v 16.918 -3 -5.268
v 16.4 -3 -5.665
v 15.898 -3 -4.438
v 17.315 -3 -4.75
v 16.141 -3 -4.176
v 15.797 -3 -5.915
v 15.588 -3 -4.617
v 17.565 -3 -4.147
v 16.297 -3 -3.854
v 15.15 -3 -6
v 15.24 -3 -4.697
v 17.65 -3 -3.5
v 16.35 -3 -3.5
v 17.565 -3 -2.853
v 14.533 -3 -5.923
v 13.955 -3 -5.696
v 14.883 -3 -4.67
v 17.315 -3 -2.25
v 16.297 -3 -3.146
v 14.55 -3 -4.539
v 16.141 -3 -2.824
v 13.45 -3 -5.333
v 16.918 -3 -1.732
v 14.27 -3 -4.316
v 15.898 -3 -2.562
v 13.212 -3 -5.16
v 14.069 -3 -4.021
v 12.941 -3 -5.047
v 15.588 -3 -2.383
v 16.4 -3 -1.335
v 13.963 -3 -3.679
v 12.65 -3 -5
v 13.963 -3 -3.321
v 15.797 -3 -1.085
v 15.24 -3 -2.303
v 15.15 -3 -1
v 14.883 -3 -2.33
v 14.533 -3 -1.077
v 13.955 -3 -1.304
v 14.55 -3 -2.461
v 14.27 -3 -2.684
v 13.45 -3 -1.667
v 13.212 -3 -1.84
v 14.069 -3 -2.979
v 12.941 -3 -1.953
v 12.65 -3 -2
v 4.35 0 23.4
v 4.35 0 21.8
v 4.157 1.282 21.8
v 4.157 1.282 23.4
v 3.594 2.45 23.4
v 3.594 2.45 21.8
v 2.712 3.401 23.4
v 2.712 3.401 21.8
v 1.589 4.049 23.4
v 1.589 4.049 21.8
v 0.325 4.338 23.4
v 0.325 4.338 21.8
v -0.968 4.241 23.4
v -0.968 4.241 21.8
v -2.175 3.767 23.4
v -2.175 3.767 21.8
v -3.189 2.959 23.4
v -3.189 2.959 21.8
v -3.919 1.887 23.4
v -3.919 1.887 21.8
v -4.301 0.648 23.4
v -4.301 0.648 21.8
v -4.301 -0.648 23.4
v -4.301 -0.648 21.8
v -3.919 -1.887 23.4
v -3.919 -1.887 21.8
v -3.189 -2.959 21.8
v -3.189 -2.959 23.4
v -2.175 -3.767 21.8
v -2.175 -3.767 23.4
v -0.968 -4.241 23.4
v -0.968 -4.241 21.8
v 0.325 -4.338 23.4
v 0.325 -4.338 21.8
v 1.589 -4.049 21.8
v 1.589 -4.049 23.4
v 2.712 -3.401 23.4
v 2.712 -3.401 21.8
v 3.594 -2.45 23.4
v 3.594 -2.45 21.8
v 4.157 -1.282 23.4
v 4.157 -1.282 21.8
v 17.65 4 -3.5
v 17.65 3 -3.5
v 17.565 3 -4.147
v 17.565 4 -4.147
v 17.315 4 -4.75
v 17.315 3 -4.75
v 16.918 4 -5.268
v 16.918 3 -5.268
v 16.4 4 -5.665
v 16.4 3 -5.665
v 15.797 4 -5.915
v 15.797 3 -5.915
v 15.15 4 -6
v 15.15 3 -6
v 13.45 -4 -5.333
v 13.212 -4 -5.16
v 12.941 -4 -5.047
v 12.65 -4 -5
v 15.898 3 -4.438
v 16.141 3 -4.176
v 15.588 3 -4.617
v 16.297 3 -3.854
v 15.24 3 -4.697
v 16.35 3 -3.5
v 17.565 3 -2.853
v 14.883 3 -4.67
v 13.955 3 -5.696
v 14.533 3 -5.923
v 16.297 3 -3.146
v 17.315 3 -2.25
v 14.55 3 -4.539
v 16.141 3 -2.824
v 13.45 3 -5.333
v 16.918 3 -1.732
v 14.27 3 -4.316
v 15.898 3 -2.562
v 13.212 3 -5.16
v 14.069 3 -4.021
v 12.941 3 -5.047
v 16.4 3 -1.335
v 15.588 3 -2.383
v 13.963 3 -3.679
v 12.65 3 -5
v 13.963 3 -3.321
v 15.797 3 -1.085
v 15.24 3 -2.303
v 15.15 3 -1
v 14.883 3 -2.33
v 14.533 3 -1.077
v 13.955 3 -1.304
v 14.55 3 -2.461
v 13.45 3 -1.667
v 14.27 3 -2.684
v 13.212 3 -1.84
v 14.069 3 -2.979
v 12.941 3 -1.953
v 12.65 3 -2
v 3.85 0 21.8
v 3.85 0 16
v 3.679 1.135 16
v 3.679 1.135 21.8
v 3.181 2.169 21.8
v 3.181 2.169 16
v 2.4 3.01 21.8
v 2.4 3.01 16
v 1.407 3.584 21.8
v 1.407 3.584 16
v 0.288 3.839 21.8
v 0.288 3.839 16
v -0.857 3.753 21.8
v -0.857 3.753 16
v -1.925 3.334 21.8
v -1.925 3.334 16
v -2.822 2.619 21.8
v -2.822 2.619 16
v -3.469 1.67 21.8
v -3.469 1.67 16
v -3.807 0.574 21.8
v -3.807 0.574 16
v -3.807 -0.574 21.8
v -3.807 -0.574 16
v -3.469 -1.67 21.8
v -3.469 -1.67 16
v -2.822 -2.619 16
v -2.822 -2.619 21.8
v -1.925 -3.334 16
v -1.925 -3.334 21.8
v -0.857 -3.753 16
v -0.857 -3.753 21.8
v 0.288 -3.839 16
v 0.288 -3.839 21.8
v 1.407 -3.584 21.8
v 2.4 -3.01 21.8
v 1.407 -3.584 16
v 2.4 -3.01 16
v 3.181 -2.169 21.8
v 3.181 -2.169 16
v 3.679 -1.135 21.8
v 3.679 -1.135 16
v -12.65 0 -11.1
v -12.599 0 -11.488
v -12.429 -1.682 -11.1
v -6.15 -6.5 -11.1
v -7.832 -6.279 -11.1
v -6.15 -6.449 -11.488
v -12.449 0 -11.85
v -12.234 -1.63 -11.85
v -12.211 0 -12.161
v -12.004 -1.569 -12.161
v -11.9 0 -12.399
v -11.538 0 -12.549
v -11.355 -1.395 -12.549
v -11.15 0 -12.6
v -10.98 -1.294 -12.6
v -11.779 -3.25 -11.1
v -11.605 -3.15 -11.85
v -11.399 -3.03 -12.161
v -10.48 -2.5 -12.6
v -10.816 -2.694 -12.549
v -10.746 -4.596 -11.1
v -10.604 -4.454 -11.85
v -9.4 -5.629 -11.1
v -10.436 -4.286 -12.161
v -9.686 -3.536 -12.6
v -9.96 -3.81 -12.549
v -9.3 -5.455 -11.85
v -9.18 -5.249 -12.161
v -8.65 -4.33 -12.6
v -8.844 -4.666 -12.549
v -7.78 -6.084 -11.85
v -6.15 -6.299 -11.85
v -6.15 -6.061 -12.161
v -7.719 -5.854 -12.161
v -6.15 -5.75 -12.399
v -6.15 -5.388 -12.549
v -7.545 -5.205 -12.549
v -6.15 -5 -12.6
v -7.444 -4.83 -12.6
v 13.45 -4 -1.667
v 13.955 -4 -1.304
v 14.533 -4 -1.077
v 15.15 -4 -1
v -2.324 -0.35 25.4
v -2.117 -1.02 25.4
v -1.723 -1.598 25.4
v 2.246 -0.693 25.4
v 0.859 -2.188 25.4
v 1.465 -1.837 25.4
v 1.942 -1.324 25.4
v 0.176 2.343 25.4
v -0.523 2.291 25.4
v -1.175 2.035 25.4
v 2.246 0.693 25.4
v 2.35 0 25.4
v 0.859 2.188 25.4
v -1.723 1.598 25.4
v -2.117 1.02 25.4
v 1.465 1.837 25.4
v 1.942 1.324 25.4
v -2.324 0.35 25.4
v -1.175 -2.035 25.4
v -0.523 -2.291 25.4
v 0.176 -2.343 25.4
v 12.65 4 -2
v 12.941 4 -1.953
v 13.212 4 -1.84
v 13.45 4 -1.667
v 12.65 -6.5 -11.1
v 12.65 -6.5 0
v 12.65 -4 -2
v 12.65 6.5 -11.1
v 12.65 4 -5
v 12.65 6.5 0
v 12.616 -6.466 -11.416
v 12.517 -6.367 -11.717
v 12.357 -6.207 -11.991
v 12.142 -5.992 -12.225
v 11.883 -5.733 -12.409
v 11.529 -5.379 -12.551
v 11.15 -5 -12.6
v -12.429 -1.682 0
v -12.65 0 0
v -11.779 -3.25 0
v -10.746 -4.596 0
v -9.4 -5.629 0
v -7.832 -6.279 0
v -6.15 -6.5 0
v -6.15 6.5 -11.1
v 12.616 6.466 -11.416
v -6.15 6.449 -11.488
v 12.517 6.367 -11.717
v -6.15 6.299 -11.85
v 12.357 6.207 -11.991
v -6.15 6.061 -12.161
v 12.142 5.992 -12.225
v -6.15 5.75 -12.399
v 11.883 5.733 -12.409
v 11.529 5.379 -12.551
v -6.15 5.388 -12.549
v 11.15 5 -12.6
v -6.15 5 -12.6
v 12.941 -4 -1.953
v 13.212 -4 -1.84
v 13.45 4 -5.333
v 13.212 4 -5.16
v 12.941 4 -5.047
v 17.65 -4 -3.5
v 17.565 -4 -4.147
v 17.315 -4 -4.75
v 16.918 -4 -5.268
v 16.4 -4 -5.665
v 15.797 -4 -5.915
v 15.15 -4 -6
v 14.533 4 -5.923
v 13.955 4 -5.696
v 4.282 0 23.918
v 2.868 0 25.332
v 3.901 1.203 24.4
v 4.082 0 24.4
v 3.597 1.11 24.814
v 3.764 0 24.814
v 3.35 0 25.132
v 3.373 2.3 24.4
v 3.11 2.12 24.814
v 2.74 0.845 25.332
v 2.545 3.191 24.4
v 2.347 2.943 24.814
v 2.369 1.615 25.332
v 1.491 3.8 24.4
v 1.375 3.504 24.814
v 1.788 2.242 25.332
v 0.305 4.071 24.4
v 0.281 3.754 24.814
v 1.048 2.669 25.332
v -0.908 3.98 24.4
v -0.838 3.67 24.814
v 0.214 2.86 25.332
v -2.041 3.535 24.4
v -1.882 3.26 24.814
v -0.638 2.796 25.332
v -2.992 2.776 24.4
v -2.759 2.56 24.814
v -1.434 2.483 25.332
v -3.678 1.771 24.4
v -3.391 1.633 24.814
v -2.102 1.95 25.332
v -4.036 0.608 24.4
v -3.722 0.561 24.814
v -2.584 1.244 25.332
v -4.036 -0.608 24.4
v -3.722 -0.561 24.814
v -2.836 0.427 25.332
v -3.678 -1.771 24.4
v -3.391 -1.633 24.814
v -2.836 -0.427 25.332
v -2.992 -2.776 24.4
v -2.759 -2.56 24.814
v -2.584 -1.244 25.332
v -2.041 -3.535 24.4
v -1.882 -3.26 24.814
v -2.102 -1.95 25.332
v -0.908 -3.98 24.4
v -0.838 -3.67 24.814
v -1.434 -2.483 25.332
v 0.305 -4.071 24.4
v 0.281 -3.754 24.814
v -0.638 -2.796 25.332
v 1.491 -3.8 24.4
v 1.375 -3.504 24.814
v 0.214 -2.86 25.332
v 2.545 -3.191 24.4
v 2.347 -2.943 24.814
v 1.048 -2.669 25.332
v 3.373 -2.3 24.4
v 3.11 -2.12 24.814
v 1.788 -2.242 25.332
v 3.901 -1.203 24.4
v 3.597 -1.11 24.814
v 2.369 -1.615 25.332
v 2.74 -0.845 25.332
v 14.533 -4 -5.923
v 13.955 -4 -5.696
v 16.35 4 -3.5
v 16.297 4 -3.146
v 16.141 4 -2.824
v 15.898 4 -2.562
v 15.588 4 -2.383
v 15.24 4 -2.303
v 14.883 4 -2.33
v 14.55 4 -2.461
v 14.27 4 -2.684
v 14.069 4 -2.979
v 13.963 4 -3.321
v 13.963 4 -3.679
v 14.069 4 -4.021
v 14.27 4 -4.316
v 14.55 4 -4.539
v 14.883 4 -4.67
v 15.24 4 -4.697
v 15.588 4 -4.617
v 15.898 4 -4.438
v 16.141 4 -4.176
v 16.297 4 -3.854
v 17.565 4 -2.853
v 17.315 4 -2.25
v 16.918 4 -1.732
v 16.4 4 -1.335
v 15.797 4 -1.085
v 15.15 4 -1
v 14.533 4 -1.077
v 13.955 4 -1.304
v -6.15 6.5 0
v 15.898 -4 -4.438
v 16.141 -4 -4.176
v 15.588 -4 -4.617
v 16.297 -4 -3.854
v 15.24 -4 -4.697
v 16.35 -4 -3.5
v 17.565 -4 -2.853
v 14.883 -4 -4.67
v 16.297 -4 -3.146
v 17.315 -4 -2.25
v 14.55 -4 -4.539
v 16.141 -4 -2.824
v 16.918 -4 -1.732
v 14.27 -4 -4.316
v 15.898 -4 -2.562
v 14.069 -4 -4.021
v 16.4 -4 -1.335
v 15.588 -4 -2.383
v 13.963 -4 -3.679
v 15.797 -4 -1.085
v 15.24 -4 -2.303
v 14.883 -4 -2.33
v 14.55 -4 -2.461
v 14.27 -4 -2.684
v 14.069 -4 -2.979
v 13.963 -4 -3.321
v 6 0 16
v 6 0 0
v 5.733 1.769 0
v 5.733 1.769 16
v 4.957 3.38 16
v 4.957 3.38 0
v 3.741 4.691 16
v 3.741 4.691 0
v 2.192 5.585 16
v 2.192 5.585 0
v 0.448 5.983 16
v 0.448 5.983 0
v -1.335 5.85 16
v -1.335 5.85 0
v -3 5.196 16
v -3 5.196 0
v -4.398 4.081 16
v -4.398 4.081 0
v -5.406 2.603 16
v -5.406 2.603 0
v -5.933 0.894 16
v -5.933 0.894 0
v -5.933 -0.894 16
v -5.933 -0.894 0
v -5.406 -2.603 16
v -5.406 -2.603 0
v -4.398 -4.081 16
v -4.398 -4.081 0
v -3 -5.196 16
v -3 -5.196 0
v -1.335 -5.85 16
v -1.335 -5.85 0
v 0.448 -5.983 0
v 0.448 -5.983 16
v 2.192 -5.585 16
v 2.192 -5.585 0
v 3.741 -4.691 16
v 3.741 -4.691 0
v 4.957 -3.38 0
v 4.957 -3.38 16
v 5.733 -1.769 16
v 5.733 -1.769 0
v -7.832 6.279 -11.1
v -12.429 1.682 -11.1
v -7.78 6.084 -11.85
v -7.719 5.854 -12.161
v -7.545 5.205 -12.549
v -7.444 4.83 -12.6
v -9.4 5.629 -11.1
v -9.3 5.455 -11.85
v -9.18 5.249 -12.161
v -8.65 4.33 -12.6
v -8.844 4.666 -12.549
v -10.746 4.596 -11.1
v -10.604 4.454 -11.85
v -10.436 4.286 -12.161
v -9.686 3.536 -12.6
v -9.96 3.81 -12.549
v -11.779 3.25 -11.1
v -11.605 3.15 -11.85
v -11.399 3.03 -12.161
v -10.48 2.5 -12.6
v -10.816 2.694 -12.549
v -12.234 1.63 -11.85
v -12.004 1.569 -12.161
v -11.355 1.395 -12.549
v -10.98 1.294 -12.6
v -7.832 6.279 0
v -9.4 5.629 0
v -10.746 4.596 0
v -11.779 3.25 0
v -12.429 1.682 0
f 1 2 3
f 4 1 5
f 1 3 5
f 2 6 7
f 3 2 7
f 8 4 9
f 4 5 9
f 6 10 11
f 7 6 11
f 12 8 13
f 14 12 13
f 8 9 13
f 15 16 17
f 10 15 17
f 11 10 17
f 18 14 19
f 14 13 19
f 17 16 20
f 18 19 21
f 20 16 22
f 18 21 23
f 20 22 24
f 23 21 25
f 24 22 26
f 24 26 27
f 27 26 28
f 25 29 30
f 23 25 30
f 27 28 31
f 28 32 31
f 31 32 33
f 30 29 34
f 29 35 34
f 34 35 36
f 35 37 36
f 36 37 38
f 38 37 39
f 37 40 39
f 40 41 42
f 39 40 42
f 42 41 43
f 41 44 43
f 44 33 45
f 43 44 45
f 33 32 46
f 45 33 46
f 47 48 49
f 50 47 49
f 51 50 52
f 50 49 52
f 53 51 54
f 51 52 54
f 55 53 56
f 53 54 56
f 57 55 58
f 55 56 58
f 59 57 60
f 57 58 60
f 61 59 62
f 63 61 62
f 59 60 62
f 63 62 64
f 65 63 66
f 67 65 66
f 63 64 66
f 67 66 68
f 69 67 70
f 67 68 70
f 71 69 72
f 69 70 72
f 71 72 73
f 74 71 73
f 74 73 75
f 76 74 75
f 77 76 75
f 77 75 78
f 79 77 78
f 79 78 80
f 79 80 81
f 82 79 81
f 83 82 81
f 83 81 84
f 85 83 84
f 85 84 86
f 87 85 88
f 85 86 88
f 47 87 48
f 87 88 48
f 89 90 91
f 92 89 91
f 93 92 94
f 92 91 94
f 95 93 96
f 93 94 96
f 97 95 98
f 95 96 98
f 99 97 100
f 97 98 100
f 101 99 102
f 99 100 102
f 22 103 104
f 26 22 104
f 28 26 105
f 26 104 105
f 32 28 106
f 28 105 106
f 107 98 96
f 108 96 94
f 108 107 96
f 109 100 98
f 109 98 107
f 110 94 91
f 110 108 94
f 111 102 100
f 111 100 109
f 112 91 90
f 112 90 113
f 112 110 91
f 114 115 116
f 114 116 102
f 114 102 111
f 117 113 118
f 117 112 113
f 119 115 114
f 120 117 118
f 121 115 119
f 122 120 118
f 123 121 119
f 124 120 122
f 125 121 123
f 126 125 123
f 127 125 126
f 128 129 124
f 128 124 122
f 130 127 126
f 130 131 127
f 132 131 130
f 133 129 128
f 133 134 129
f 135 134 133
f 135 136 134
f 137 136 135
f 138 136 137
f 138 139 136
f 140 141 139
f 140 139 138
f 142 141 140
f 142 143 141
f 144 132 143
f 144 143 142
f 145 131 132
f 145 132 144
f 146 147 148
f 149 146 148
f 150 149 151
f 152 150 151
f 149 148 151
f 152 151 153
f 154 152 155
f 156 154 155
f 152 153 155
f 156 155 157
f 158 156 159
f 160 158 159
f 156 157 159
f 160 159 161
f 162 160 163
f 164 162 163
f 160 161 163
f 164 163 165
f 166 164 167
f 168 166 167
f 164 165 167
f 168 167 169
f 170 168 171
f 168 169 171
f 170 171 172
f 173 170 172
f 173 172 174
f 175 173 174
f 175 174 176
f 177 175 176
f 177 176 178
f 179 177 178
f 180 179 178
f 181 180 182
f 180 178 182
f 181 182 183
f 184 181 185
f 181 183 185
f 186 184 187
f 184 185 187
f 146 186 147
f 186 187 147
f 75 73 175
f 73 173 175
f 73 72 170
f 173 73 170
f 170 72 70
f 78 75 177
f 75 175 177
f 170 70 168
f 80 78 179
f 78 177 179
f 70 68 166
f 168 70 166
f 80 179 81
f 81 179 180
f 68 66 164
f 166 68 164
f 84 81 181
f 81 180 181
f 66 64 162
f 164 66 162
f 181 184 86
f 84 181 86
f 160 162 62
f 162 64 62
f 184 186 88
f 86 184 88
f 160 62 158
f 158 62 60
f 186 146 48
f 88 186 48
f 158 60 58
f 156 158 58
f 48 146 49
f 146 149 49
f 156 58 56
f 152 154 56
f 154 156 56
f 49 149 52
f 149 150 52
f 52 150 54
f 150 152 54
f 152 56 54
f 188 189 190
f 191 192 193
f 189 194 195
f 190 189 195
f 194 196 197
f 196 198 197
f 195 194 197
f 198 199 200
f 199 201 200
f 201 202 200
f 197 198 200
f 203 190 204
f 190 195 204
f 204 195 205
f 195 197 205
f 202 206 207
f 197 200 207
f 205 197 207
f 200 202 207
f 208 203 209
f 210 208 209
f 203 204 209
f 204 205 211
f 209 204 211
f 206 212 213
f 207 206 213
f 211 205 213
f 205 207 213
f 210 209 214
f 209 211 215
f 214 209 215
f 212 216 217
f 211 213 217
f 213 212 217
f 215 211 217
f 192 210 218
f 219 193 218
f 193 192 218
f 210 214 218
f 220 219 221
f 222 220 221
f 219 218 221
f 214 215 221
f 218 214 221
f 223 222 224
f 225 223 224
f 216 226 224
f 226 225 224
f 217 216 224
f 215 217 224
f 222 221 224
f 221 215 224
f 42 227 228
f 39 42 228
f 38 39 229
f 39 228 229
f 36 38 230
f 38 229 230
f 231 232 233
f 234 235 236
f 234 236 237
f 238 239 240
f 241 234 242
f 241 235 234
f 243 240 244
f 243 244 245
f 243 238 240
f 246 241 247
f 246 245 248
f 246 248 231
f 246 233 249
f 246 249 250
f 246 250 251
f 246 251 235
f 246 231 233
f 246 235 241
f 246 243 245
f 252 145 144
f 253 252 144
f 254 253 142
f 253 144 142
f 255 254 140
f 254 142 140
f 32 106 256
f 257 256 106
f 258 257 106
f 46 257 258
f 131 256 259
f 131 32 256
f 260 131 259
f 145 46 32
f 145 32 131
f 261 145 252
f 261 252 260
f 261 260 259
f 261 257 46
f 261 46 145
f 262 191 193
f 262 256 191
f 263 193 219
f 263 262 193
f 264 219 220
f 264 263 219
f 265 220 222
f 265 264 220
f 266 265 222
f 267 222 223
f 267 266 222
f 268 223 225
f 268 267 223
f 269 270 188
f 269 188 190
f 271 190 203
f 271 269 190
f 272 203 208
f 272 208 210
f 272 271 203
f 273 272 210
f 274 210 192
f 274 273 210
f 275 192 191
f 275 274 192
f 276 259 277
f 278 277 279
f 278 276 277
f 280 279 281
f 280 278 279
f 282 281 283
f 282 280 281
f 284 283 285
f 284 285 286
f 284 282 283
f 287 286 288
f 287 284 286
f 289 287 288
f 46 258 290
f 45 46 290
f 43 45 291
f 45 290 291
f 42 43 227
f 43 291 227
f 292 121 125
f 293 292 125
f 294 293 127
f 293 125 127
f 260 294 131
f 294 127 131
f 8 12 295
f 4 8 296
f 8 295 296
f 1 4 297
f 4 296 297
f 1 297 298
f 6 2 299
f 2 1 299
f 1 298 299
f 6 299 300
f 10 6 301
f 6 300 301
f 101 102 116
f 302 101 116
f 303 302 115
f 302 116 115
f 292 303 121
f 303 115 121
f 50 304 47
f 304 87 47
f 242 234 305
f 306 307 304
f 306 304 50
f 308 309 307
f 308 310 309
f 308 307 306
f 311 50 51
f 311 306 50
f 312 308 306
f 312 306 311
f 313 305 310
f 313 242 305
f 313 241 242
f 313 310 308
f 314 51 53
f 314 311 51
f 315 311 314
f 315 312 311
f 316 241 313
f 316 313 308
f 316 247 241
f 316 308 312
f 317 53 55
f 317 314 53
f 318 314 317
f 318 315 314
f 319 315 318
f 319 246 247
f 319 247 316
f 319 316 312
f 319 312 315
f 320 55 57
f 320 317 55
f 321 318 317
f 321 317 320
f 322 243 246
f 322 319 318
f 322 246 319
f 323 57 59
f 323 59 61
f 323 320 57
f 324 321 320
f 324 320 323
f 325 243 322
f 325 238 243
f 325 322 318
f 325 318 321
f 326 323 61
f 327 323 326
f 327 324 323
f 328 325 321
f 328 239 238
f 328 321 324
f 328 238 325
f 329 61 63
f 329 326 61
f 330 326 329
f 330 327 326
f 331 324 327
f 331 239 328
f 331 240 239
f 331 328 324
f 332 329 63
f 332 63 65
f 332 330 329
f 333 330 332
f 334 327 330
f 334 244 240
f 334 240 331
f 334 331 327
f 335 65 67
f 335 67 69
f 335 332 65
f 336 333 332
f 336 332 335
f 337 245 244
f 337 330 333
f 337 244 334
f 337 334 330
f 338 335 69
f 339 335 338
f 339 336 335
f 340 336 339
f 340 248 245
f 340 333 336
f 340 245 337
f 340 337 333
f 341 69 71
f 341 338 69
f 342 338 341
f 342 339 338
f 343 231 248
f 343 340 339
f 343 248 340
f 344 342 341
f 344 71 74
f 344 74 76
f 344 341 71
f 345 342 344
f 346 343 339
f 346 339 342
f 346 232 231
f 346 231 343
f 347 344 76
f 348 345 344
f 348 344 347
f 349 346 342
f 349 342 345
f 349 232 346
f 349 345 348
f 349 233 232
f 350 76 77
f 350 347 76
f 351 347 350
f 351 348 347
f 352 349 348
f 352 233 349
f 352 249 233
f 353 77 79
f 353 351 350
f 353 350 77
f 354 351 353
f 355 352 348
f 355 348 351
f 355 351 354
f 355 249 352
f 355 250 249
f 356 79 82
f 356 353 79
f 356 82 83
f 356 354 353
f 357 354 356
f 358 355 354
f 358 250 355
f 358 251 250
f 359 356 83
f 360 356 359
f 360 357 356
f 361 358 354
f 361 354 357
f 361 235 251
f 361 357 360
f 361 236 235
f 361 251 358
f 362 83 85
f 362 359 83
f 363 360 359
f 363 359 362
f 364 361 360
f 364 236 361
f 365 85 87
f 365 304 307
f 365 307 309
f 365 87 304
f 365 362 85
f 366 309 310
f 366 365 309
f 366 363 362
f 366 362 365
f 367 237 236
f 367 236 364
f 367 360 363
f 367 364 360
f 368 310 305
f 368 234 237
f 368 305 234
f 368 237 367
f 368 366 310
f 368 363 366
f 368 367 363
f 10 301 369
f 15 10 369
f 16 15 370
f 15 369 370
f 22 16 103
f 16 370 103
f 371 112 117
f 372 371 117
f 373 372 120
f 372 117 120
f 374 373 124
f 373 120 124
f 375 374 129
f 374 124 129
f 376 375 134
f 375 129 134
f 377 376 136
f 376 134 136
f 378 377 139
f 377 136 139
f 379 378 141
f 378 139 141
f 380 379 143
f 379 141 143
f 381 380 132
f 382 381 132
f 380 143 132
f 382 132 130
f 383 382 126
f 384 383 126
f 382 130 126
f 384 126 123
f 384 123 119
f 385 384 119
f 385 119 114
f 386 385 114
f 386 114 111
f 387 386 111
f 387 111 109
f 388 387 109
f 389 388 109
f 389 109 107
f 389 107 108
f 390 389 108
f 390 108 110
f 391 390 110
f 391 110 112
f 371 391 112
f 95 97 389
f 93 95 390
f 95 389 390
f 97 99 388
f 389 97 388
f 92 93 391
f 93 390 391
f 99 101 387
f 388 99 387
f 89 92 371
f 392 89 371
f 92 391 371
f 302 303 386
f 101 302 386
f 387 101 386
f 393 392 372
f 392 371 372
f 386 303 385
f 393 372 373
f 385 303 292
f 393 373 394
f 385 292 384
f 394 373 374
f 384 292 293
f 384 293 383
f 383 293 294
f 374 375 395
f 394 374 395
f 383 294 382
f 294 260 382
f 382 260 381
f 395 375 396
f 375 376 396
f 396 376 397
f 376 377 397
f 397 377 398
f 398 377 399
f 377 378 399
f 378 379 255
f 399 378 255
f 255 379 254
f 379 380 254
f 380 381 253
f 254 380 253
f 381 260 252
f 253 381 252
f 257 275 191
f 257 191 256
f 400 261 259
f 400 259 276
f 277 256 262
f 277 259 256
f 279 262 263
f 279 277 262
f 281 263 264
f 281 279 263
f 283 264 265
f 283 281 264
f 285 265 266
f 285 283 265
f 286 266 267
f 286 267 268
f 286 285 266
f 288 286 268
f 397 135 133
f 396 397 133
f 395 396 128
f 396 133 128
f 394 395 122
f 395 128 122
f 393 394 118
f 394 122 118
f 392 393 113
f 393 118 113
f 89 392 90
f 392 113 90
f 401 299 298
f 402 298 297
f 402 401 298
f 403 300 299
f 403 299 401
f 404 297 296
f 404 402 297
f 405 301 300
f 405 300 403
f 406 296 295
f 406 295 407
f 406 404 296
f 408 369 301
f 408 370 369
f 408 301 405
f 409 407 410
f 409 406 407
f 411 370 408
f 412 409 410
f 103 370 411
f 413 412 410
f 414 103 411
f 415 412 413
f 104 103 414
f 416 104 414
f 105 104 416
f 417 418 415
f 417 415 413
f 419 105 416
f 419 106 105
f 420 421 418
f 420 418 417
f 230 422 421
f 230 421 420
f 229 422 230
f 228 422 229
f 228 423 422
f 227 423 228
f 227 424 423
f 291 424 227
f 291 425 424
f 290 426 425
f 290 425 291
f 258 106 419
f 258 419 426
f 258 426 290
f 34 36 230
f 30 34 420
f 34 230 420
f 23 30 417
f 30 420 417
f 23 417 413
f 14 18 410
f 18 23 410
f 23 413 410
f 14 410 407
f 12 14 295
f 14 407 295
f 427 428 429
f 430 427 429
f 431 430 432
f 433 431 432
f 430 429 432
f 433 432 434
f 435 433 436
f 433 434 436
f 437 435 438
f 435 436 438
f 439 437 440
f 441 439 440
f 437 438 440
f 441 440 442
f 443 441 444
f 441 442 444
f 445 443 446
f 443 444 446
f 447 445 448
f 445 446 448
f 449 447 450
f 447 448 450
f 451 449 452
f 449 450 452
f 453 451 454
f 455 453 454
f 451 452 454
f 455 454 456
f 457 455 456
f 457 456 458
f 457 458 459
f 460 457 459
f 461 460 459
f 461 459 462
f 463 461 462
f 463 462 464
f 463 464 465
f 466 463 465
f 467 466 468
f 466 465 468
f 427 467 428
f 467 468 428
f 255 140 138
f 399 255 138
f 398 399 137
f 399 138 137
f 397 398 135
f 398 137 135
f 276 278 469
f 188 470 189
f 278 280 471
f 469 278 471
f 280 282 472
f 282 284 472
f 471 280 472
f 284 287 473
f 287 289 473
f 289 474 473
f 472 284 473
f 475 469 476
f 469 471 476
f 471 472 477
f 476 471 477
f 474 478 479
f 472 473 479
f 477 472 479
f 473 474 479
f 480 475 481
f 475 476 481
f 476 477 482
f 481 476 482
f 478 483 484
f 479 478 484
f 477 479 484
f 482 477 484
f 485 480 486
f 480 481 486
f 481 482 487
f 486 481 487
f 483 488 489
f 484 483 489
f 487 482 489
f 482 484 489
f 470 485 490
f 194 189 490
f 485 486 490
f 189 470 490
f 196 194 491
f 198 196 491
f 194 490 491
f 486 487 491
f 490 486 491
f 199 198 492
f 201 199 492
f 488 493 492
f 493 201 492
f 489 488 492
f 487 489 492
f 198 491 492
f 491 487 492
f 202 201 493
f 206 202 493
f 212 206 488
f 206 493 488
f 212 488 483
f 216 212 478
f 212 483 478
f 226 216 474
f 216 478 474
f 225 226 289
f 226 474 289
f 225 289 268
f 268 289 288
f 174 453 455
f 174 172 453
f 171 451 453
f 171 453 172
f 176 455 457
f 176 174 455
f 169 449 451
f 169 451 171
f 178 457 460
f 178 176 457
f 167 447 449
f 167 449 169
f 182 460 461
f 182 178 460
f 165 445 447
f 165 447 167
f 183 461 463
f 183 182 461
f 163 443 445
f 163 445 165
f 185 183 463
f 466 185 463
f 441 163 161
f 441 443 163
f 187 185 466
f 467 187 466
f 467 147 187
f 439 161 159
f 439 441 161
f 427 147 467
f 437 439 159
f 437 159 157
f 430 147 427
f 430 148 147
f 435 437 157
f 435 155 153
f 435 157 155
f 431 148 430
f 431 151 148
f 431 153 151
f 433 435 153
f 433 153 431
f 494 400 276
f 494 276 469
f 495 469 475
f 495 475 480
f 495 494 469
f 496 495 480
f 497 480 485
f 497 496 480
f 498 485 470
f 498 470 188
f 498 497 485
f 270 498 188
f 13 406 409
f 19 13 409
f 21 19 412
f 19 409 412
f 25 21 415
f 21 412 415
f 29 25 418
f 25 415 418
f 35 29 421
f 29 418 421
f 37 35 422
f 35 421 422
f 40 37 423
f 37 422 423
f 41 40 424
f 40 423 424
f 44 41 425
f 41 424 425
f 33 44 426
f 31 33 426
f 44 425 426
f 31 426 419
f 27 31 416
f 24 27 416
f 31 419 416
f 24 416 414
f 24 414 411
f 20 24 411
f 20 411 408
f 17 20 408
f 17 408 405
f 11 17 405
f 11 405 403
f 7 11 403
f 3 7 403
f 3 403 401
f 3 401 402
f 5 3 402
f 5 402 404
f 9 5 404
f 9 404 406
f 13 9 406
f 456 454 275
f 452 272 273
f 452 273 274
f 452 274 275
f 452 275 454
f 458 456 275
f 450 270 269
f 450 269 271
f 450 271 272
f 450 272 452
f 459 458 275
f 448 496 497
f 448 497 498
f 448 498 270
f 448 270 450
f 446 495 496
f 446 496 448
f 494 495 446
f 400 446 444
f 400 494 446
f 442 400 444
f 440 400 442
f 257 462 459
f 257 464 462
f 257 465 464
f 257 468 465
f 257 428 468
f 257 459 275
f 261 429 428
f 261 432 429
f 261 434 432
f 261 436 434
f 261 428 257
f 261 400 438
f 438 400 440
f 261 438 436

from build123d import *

# Parameters (mm, degrees)
F1_DEPTH  = 12.6
F2_R      = 6
F3_DEPTH  = 16
F4_R      = 3.85
F5_DEPTH  = 5.8
F6_R      = 4.35
F7_DEPTH  = 3.6
F8_R      = 2
F9_R      = 1.5
F10_W     = 1
F10_H     = 5
F11_DEPTH = 5
F12_R     = 1.2
F13_DEPTH = 10.501


with BuildPart() as f1:
    # F0 (on Top) → F1 (new body)
    with BuildSketch(Plane.XY):
        with BuildLine():
            Line((-6.15, -6.5), (12.65, -6.5))
            Line((12.65, -6.5), (12.65, 6.5))
            Line((12.65, 6.5), (-6.15, 6.5))
            ThreePointArc((-6.15, 6.5), (-10.746194, 4.596194), (-12.65, 0))
            ThreePointArc((-12.65, 0), (-10.746194, -4.596194), (-6.15, -6.5))
        make_face()
    extrude(amount=-F1_DEPTH)

    # F2 (on Top) → F3 (join)
    with BuildSketch(Plane.XY):
        Circle(F2_R)
    extrude(amount=F3_DEPTH)

    # F4 (on face) → F5 (join)
    with BuildSketch(Plane.XY.offset(16)):
        Circle(F4_R)
    extrude(amount=F5_DEPTH)

    # F6 (on face) → F7 (join)
    with BuildSketch(Plane.XY.offset(21.8)):
        Circle(F6_R)
    extrude(amount=F7_DEPTH)

    # F8
    f8_edges = [f1.edges().sort_by_distance(p)[0] for p in [
        (-4.35, 0, 25.4),
    ]]
    fillet(f8_edges, radius=F8_R)

    # F9
    f9_edges = [f1.edges().sort_by_distance(p)[0] for p in [
        (3.25, -6.5, -12.6),
        (12.65, 0, -12.6),
        (3.25, 6.5, -12.6),
        (-12.65, 0, -12.6),
    ]]
    fillet(f9_edges, radius=F9_R)

    # F10 (on face) → F11 (join)
    with BuildSketch(Plane.YZ.offset(12.65)):
        with Locations((-3.5, -3.5)):
            Rectangle(F10_W, F10_H)
        with Locations((3.5, -3.5)):
            Rectangle(F10_W, F10_H)
    extrude(amount=F11_DEPTH)

    # F12 (on face) → F13 (cut, through all)
    with BuildSketch(Plane.XZ.offset(4)):
        with Locations((15.15, -3.5)):
            Circle(F12_R)
        with BuildLine():
            Line((12.65, -1), (12.65, -2))
            ThreePointArc((12.65, -2), (13.079724, -1.904888), (13.45, -1.66697))
            ThreePointArc((13.45, -1.66697), (14.236922, -1.172708), (15.15, -1))
            Line((15.15, -1), (12.65, -1))
        make_face()
        with BuildLine():
            ThreePointArc((17.65, -3.5), (16.917767, -5.267767), (15.15, -6))
            Line((15.15, -6), (17.65, -6))
            Line((17.65, -6), (17.65, -3.5))
        make_face()
        with BuildLine():
            ThreePointArc((15.15, -1), (16.917767, -1.732233), (17.65, -3.5))
            Line((17.65, -3.5), (17.65, -1))
            Line((17.65, -1), (15.15, -1))
        make_face()
        with BuildLine():
            ThreePointArc((15.15, -6), (14.236922, -5.827292), (13.45, -5.33303))
            ThreePointArc((13.45, -5.33303), (13.079724, -5.095112), (12.65, -5))
            Line((12.65, -5), (12.65, -6))
            Line((12.65, -6), (15.15, -6))
        make_face()
    extrude(amount=-F13_DEPTH, mode=Mode.SUBTRACT)


solid = f1.part
